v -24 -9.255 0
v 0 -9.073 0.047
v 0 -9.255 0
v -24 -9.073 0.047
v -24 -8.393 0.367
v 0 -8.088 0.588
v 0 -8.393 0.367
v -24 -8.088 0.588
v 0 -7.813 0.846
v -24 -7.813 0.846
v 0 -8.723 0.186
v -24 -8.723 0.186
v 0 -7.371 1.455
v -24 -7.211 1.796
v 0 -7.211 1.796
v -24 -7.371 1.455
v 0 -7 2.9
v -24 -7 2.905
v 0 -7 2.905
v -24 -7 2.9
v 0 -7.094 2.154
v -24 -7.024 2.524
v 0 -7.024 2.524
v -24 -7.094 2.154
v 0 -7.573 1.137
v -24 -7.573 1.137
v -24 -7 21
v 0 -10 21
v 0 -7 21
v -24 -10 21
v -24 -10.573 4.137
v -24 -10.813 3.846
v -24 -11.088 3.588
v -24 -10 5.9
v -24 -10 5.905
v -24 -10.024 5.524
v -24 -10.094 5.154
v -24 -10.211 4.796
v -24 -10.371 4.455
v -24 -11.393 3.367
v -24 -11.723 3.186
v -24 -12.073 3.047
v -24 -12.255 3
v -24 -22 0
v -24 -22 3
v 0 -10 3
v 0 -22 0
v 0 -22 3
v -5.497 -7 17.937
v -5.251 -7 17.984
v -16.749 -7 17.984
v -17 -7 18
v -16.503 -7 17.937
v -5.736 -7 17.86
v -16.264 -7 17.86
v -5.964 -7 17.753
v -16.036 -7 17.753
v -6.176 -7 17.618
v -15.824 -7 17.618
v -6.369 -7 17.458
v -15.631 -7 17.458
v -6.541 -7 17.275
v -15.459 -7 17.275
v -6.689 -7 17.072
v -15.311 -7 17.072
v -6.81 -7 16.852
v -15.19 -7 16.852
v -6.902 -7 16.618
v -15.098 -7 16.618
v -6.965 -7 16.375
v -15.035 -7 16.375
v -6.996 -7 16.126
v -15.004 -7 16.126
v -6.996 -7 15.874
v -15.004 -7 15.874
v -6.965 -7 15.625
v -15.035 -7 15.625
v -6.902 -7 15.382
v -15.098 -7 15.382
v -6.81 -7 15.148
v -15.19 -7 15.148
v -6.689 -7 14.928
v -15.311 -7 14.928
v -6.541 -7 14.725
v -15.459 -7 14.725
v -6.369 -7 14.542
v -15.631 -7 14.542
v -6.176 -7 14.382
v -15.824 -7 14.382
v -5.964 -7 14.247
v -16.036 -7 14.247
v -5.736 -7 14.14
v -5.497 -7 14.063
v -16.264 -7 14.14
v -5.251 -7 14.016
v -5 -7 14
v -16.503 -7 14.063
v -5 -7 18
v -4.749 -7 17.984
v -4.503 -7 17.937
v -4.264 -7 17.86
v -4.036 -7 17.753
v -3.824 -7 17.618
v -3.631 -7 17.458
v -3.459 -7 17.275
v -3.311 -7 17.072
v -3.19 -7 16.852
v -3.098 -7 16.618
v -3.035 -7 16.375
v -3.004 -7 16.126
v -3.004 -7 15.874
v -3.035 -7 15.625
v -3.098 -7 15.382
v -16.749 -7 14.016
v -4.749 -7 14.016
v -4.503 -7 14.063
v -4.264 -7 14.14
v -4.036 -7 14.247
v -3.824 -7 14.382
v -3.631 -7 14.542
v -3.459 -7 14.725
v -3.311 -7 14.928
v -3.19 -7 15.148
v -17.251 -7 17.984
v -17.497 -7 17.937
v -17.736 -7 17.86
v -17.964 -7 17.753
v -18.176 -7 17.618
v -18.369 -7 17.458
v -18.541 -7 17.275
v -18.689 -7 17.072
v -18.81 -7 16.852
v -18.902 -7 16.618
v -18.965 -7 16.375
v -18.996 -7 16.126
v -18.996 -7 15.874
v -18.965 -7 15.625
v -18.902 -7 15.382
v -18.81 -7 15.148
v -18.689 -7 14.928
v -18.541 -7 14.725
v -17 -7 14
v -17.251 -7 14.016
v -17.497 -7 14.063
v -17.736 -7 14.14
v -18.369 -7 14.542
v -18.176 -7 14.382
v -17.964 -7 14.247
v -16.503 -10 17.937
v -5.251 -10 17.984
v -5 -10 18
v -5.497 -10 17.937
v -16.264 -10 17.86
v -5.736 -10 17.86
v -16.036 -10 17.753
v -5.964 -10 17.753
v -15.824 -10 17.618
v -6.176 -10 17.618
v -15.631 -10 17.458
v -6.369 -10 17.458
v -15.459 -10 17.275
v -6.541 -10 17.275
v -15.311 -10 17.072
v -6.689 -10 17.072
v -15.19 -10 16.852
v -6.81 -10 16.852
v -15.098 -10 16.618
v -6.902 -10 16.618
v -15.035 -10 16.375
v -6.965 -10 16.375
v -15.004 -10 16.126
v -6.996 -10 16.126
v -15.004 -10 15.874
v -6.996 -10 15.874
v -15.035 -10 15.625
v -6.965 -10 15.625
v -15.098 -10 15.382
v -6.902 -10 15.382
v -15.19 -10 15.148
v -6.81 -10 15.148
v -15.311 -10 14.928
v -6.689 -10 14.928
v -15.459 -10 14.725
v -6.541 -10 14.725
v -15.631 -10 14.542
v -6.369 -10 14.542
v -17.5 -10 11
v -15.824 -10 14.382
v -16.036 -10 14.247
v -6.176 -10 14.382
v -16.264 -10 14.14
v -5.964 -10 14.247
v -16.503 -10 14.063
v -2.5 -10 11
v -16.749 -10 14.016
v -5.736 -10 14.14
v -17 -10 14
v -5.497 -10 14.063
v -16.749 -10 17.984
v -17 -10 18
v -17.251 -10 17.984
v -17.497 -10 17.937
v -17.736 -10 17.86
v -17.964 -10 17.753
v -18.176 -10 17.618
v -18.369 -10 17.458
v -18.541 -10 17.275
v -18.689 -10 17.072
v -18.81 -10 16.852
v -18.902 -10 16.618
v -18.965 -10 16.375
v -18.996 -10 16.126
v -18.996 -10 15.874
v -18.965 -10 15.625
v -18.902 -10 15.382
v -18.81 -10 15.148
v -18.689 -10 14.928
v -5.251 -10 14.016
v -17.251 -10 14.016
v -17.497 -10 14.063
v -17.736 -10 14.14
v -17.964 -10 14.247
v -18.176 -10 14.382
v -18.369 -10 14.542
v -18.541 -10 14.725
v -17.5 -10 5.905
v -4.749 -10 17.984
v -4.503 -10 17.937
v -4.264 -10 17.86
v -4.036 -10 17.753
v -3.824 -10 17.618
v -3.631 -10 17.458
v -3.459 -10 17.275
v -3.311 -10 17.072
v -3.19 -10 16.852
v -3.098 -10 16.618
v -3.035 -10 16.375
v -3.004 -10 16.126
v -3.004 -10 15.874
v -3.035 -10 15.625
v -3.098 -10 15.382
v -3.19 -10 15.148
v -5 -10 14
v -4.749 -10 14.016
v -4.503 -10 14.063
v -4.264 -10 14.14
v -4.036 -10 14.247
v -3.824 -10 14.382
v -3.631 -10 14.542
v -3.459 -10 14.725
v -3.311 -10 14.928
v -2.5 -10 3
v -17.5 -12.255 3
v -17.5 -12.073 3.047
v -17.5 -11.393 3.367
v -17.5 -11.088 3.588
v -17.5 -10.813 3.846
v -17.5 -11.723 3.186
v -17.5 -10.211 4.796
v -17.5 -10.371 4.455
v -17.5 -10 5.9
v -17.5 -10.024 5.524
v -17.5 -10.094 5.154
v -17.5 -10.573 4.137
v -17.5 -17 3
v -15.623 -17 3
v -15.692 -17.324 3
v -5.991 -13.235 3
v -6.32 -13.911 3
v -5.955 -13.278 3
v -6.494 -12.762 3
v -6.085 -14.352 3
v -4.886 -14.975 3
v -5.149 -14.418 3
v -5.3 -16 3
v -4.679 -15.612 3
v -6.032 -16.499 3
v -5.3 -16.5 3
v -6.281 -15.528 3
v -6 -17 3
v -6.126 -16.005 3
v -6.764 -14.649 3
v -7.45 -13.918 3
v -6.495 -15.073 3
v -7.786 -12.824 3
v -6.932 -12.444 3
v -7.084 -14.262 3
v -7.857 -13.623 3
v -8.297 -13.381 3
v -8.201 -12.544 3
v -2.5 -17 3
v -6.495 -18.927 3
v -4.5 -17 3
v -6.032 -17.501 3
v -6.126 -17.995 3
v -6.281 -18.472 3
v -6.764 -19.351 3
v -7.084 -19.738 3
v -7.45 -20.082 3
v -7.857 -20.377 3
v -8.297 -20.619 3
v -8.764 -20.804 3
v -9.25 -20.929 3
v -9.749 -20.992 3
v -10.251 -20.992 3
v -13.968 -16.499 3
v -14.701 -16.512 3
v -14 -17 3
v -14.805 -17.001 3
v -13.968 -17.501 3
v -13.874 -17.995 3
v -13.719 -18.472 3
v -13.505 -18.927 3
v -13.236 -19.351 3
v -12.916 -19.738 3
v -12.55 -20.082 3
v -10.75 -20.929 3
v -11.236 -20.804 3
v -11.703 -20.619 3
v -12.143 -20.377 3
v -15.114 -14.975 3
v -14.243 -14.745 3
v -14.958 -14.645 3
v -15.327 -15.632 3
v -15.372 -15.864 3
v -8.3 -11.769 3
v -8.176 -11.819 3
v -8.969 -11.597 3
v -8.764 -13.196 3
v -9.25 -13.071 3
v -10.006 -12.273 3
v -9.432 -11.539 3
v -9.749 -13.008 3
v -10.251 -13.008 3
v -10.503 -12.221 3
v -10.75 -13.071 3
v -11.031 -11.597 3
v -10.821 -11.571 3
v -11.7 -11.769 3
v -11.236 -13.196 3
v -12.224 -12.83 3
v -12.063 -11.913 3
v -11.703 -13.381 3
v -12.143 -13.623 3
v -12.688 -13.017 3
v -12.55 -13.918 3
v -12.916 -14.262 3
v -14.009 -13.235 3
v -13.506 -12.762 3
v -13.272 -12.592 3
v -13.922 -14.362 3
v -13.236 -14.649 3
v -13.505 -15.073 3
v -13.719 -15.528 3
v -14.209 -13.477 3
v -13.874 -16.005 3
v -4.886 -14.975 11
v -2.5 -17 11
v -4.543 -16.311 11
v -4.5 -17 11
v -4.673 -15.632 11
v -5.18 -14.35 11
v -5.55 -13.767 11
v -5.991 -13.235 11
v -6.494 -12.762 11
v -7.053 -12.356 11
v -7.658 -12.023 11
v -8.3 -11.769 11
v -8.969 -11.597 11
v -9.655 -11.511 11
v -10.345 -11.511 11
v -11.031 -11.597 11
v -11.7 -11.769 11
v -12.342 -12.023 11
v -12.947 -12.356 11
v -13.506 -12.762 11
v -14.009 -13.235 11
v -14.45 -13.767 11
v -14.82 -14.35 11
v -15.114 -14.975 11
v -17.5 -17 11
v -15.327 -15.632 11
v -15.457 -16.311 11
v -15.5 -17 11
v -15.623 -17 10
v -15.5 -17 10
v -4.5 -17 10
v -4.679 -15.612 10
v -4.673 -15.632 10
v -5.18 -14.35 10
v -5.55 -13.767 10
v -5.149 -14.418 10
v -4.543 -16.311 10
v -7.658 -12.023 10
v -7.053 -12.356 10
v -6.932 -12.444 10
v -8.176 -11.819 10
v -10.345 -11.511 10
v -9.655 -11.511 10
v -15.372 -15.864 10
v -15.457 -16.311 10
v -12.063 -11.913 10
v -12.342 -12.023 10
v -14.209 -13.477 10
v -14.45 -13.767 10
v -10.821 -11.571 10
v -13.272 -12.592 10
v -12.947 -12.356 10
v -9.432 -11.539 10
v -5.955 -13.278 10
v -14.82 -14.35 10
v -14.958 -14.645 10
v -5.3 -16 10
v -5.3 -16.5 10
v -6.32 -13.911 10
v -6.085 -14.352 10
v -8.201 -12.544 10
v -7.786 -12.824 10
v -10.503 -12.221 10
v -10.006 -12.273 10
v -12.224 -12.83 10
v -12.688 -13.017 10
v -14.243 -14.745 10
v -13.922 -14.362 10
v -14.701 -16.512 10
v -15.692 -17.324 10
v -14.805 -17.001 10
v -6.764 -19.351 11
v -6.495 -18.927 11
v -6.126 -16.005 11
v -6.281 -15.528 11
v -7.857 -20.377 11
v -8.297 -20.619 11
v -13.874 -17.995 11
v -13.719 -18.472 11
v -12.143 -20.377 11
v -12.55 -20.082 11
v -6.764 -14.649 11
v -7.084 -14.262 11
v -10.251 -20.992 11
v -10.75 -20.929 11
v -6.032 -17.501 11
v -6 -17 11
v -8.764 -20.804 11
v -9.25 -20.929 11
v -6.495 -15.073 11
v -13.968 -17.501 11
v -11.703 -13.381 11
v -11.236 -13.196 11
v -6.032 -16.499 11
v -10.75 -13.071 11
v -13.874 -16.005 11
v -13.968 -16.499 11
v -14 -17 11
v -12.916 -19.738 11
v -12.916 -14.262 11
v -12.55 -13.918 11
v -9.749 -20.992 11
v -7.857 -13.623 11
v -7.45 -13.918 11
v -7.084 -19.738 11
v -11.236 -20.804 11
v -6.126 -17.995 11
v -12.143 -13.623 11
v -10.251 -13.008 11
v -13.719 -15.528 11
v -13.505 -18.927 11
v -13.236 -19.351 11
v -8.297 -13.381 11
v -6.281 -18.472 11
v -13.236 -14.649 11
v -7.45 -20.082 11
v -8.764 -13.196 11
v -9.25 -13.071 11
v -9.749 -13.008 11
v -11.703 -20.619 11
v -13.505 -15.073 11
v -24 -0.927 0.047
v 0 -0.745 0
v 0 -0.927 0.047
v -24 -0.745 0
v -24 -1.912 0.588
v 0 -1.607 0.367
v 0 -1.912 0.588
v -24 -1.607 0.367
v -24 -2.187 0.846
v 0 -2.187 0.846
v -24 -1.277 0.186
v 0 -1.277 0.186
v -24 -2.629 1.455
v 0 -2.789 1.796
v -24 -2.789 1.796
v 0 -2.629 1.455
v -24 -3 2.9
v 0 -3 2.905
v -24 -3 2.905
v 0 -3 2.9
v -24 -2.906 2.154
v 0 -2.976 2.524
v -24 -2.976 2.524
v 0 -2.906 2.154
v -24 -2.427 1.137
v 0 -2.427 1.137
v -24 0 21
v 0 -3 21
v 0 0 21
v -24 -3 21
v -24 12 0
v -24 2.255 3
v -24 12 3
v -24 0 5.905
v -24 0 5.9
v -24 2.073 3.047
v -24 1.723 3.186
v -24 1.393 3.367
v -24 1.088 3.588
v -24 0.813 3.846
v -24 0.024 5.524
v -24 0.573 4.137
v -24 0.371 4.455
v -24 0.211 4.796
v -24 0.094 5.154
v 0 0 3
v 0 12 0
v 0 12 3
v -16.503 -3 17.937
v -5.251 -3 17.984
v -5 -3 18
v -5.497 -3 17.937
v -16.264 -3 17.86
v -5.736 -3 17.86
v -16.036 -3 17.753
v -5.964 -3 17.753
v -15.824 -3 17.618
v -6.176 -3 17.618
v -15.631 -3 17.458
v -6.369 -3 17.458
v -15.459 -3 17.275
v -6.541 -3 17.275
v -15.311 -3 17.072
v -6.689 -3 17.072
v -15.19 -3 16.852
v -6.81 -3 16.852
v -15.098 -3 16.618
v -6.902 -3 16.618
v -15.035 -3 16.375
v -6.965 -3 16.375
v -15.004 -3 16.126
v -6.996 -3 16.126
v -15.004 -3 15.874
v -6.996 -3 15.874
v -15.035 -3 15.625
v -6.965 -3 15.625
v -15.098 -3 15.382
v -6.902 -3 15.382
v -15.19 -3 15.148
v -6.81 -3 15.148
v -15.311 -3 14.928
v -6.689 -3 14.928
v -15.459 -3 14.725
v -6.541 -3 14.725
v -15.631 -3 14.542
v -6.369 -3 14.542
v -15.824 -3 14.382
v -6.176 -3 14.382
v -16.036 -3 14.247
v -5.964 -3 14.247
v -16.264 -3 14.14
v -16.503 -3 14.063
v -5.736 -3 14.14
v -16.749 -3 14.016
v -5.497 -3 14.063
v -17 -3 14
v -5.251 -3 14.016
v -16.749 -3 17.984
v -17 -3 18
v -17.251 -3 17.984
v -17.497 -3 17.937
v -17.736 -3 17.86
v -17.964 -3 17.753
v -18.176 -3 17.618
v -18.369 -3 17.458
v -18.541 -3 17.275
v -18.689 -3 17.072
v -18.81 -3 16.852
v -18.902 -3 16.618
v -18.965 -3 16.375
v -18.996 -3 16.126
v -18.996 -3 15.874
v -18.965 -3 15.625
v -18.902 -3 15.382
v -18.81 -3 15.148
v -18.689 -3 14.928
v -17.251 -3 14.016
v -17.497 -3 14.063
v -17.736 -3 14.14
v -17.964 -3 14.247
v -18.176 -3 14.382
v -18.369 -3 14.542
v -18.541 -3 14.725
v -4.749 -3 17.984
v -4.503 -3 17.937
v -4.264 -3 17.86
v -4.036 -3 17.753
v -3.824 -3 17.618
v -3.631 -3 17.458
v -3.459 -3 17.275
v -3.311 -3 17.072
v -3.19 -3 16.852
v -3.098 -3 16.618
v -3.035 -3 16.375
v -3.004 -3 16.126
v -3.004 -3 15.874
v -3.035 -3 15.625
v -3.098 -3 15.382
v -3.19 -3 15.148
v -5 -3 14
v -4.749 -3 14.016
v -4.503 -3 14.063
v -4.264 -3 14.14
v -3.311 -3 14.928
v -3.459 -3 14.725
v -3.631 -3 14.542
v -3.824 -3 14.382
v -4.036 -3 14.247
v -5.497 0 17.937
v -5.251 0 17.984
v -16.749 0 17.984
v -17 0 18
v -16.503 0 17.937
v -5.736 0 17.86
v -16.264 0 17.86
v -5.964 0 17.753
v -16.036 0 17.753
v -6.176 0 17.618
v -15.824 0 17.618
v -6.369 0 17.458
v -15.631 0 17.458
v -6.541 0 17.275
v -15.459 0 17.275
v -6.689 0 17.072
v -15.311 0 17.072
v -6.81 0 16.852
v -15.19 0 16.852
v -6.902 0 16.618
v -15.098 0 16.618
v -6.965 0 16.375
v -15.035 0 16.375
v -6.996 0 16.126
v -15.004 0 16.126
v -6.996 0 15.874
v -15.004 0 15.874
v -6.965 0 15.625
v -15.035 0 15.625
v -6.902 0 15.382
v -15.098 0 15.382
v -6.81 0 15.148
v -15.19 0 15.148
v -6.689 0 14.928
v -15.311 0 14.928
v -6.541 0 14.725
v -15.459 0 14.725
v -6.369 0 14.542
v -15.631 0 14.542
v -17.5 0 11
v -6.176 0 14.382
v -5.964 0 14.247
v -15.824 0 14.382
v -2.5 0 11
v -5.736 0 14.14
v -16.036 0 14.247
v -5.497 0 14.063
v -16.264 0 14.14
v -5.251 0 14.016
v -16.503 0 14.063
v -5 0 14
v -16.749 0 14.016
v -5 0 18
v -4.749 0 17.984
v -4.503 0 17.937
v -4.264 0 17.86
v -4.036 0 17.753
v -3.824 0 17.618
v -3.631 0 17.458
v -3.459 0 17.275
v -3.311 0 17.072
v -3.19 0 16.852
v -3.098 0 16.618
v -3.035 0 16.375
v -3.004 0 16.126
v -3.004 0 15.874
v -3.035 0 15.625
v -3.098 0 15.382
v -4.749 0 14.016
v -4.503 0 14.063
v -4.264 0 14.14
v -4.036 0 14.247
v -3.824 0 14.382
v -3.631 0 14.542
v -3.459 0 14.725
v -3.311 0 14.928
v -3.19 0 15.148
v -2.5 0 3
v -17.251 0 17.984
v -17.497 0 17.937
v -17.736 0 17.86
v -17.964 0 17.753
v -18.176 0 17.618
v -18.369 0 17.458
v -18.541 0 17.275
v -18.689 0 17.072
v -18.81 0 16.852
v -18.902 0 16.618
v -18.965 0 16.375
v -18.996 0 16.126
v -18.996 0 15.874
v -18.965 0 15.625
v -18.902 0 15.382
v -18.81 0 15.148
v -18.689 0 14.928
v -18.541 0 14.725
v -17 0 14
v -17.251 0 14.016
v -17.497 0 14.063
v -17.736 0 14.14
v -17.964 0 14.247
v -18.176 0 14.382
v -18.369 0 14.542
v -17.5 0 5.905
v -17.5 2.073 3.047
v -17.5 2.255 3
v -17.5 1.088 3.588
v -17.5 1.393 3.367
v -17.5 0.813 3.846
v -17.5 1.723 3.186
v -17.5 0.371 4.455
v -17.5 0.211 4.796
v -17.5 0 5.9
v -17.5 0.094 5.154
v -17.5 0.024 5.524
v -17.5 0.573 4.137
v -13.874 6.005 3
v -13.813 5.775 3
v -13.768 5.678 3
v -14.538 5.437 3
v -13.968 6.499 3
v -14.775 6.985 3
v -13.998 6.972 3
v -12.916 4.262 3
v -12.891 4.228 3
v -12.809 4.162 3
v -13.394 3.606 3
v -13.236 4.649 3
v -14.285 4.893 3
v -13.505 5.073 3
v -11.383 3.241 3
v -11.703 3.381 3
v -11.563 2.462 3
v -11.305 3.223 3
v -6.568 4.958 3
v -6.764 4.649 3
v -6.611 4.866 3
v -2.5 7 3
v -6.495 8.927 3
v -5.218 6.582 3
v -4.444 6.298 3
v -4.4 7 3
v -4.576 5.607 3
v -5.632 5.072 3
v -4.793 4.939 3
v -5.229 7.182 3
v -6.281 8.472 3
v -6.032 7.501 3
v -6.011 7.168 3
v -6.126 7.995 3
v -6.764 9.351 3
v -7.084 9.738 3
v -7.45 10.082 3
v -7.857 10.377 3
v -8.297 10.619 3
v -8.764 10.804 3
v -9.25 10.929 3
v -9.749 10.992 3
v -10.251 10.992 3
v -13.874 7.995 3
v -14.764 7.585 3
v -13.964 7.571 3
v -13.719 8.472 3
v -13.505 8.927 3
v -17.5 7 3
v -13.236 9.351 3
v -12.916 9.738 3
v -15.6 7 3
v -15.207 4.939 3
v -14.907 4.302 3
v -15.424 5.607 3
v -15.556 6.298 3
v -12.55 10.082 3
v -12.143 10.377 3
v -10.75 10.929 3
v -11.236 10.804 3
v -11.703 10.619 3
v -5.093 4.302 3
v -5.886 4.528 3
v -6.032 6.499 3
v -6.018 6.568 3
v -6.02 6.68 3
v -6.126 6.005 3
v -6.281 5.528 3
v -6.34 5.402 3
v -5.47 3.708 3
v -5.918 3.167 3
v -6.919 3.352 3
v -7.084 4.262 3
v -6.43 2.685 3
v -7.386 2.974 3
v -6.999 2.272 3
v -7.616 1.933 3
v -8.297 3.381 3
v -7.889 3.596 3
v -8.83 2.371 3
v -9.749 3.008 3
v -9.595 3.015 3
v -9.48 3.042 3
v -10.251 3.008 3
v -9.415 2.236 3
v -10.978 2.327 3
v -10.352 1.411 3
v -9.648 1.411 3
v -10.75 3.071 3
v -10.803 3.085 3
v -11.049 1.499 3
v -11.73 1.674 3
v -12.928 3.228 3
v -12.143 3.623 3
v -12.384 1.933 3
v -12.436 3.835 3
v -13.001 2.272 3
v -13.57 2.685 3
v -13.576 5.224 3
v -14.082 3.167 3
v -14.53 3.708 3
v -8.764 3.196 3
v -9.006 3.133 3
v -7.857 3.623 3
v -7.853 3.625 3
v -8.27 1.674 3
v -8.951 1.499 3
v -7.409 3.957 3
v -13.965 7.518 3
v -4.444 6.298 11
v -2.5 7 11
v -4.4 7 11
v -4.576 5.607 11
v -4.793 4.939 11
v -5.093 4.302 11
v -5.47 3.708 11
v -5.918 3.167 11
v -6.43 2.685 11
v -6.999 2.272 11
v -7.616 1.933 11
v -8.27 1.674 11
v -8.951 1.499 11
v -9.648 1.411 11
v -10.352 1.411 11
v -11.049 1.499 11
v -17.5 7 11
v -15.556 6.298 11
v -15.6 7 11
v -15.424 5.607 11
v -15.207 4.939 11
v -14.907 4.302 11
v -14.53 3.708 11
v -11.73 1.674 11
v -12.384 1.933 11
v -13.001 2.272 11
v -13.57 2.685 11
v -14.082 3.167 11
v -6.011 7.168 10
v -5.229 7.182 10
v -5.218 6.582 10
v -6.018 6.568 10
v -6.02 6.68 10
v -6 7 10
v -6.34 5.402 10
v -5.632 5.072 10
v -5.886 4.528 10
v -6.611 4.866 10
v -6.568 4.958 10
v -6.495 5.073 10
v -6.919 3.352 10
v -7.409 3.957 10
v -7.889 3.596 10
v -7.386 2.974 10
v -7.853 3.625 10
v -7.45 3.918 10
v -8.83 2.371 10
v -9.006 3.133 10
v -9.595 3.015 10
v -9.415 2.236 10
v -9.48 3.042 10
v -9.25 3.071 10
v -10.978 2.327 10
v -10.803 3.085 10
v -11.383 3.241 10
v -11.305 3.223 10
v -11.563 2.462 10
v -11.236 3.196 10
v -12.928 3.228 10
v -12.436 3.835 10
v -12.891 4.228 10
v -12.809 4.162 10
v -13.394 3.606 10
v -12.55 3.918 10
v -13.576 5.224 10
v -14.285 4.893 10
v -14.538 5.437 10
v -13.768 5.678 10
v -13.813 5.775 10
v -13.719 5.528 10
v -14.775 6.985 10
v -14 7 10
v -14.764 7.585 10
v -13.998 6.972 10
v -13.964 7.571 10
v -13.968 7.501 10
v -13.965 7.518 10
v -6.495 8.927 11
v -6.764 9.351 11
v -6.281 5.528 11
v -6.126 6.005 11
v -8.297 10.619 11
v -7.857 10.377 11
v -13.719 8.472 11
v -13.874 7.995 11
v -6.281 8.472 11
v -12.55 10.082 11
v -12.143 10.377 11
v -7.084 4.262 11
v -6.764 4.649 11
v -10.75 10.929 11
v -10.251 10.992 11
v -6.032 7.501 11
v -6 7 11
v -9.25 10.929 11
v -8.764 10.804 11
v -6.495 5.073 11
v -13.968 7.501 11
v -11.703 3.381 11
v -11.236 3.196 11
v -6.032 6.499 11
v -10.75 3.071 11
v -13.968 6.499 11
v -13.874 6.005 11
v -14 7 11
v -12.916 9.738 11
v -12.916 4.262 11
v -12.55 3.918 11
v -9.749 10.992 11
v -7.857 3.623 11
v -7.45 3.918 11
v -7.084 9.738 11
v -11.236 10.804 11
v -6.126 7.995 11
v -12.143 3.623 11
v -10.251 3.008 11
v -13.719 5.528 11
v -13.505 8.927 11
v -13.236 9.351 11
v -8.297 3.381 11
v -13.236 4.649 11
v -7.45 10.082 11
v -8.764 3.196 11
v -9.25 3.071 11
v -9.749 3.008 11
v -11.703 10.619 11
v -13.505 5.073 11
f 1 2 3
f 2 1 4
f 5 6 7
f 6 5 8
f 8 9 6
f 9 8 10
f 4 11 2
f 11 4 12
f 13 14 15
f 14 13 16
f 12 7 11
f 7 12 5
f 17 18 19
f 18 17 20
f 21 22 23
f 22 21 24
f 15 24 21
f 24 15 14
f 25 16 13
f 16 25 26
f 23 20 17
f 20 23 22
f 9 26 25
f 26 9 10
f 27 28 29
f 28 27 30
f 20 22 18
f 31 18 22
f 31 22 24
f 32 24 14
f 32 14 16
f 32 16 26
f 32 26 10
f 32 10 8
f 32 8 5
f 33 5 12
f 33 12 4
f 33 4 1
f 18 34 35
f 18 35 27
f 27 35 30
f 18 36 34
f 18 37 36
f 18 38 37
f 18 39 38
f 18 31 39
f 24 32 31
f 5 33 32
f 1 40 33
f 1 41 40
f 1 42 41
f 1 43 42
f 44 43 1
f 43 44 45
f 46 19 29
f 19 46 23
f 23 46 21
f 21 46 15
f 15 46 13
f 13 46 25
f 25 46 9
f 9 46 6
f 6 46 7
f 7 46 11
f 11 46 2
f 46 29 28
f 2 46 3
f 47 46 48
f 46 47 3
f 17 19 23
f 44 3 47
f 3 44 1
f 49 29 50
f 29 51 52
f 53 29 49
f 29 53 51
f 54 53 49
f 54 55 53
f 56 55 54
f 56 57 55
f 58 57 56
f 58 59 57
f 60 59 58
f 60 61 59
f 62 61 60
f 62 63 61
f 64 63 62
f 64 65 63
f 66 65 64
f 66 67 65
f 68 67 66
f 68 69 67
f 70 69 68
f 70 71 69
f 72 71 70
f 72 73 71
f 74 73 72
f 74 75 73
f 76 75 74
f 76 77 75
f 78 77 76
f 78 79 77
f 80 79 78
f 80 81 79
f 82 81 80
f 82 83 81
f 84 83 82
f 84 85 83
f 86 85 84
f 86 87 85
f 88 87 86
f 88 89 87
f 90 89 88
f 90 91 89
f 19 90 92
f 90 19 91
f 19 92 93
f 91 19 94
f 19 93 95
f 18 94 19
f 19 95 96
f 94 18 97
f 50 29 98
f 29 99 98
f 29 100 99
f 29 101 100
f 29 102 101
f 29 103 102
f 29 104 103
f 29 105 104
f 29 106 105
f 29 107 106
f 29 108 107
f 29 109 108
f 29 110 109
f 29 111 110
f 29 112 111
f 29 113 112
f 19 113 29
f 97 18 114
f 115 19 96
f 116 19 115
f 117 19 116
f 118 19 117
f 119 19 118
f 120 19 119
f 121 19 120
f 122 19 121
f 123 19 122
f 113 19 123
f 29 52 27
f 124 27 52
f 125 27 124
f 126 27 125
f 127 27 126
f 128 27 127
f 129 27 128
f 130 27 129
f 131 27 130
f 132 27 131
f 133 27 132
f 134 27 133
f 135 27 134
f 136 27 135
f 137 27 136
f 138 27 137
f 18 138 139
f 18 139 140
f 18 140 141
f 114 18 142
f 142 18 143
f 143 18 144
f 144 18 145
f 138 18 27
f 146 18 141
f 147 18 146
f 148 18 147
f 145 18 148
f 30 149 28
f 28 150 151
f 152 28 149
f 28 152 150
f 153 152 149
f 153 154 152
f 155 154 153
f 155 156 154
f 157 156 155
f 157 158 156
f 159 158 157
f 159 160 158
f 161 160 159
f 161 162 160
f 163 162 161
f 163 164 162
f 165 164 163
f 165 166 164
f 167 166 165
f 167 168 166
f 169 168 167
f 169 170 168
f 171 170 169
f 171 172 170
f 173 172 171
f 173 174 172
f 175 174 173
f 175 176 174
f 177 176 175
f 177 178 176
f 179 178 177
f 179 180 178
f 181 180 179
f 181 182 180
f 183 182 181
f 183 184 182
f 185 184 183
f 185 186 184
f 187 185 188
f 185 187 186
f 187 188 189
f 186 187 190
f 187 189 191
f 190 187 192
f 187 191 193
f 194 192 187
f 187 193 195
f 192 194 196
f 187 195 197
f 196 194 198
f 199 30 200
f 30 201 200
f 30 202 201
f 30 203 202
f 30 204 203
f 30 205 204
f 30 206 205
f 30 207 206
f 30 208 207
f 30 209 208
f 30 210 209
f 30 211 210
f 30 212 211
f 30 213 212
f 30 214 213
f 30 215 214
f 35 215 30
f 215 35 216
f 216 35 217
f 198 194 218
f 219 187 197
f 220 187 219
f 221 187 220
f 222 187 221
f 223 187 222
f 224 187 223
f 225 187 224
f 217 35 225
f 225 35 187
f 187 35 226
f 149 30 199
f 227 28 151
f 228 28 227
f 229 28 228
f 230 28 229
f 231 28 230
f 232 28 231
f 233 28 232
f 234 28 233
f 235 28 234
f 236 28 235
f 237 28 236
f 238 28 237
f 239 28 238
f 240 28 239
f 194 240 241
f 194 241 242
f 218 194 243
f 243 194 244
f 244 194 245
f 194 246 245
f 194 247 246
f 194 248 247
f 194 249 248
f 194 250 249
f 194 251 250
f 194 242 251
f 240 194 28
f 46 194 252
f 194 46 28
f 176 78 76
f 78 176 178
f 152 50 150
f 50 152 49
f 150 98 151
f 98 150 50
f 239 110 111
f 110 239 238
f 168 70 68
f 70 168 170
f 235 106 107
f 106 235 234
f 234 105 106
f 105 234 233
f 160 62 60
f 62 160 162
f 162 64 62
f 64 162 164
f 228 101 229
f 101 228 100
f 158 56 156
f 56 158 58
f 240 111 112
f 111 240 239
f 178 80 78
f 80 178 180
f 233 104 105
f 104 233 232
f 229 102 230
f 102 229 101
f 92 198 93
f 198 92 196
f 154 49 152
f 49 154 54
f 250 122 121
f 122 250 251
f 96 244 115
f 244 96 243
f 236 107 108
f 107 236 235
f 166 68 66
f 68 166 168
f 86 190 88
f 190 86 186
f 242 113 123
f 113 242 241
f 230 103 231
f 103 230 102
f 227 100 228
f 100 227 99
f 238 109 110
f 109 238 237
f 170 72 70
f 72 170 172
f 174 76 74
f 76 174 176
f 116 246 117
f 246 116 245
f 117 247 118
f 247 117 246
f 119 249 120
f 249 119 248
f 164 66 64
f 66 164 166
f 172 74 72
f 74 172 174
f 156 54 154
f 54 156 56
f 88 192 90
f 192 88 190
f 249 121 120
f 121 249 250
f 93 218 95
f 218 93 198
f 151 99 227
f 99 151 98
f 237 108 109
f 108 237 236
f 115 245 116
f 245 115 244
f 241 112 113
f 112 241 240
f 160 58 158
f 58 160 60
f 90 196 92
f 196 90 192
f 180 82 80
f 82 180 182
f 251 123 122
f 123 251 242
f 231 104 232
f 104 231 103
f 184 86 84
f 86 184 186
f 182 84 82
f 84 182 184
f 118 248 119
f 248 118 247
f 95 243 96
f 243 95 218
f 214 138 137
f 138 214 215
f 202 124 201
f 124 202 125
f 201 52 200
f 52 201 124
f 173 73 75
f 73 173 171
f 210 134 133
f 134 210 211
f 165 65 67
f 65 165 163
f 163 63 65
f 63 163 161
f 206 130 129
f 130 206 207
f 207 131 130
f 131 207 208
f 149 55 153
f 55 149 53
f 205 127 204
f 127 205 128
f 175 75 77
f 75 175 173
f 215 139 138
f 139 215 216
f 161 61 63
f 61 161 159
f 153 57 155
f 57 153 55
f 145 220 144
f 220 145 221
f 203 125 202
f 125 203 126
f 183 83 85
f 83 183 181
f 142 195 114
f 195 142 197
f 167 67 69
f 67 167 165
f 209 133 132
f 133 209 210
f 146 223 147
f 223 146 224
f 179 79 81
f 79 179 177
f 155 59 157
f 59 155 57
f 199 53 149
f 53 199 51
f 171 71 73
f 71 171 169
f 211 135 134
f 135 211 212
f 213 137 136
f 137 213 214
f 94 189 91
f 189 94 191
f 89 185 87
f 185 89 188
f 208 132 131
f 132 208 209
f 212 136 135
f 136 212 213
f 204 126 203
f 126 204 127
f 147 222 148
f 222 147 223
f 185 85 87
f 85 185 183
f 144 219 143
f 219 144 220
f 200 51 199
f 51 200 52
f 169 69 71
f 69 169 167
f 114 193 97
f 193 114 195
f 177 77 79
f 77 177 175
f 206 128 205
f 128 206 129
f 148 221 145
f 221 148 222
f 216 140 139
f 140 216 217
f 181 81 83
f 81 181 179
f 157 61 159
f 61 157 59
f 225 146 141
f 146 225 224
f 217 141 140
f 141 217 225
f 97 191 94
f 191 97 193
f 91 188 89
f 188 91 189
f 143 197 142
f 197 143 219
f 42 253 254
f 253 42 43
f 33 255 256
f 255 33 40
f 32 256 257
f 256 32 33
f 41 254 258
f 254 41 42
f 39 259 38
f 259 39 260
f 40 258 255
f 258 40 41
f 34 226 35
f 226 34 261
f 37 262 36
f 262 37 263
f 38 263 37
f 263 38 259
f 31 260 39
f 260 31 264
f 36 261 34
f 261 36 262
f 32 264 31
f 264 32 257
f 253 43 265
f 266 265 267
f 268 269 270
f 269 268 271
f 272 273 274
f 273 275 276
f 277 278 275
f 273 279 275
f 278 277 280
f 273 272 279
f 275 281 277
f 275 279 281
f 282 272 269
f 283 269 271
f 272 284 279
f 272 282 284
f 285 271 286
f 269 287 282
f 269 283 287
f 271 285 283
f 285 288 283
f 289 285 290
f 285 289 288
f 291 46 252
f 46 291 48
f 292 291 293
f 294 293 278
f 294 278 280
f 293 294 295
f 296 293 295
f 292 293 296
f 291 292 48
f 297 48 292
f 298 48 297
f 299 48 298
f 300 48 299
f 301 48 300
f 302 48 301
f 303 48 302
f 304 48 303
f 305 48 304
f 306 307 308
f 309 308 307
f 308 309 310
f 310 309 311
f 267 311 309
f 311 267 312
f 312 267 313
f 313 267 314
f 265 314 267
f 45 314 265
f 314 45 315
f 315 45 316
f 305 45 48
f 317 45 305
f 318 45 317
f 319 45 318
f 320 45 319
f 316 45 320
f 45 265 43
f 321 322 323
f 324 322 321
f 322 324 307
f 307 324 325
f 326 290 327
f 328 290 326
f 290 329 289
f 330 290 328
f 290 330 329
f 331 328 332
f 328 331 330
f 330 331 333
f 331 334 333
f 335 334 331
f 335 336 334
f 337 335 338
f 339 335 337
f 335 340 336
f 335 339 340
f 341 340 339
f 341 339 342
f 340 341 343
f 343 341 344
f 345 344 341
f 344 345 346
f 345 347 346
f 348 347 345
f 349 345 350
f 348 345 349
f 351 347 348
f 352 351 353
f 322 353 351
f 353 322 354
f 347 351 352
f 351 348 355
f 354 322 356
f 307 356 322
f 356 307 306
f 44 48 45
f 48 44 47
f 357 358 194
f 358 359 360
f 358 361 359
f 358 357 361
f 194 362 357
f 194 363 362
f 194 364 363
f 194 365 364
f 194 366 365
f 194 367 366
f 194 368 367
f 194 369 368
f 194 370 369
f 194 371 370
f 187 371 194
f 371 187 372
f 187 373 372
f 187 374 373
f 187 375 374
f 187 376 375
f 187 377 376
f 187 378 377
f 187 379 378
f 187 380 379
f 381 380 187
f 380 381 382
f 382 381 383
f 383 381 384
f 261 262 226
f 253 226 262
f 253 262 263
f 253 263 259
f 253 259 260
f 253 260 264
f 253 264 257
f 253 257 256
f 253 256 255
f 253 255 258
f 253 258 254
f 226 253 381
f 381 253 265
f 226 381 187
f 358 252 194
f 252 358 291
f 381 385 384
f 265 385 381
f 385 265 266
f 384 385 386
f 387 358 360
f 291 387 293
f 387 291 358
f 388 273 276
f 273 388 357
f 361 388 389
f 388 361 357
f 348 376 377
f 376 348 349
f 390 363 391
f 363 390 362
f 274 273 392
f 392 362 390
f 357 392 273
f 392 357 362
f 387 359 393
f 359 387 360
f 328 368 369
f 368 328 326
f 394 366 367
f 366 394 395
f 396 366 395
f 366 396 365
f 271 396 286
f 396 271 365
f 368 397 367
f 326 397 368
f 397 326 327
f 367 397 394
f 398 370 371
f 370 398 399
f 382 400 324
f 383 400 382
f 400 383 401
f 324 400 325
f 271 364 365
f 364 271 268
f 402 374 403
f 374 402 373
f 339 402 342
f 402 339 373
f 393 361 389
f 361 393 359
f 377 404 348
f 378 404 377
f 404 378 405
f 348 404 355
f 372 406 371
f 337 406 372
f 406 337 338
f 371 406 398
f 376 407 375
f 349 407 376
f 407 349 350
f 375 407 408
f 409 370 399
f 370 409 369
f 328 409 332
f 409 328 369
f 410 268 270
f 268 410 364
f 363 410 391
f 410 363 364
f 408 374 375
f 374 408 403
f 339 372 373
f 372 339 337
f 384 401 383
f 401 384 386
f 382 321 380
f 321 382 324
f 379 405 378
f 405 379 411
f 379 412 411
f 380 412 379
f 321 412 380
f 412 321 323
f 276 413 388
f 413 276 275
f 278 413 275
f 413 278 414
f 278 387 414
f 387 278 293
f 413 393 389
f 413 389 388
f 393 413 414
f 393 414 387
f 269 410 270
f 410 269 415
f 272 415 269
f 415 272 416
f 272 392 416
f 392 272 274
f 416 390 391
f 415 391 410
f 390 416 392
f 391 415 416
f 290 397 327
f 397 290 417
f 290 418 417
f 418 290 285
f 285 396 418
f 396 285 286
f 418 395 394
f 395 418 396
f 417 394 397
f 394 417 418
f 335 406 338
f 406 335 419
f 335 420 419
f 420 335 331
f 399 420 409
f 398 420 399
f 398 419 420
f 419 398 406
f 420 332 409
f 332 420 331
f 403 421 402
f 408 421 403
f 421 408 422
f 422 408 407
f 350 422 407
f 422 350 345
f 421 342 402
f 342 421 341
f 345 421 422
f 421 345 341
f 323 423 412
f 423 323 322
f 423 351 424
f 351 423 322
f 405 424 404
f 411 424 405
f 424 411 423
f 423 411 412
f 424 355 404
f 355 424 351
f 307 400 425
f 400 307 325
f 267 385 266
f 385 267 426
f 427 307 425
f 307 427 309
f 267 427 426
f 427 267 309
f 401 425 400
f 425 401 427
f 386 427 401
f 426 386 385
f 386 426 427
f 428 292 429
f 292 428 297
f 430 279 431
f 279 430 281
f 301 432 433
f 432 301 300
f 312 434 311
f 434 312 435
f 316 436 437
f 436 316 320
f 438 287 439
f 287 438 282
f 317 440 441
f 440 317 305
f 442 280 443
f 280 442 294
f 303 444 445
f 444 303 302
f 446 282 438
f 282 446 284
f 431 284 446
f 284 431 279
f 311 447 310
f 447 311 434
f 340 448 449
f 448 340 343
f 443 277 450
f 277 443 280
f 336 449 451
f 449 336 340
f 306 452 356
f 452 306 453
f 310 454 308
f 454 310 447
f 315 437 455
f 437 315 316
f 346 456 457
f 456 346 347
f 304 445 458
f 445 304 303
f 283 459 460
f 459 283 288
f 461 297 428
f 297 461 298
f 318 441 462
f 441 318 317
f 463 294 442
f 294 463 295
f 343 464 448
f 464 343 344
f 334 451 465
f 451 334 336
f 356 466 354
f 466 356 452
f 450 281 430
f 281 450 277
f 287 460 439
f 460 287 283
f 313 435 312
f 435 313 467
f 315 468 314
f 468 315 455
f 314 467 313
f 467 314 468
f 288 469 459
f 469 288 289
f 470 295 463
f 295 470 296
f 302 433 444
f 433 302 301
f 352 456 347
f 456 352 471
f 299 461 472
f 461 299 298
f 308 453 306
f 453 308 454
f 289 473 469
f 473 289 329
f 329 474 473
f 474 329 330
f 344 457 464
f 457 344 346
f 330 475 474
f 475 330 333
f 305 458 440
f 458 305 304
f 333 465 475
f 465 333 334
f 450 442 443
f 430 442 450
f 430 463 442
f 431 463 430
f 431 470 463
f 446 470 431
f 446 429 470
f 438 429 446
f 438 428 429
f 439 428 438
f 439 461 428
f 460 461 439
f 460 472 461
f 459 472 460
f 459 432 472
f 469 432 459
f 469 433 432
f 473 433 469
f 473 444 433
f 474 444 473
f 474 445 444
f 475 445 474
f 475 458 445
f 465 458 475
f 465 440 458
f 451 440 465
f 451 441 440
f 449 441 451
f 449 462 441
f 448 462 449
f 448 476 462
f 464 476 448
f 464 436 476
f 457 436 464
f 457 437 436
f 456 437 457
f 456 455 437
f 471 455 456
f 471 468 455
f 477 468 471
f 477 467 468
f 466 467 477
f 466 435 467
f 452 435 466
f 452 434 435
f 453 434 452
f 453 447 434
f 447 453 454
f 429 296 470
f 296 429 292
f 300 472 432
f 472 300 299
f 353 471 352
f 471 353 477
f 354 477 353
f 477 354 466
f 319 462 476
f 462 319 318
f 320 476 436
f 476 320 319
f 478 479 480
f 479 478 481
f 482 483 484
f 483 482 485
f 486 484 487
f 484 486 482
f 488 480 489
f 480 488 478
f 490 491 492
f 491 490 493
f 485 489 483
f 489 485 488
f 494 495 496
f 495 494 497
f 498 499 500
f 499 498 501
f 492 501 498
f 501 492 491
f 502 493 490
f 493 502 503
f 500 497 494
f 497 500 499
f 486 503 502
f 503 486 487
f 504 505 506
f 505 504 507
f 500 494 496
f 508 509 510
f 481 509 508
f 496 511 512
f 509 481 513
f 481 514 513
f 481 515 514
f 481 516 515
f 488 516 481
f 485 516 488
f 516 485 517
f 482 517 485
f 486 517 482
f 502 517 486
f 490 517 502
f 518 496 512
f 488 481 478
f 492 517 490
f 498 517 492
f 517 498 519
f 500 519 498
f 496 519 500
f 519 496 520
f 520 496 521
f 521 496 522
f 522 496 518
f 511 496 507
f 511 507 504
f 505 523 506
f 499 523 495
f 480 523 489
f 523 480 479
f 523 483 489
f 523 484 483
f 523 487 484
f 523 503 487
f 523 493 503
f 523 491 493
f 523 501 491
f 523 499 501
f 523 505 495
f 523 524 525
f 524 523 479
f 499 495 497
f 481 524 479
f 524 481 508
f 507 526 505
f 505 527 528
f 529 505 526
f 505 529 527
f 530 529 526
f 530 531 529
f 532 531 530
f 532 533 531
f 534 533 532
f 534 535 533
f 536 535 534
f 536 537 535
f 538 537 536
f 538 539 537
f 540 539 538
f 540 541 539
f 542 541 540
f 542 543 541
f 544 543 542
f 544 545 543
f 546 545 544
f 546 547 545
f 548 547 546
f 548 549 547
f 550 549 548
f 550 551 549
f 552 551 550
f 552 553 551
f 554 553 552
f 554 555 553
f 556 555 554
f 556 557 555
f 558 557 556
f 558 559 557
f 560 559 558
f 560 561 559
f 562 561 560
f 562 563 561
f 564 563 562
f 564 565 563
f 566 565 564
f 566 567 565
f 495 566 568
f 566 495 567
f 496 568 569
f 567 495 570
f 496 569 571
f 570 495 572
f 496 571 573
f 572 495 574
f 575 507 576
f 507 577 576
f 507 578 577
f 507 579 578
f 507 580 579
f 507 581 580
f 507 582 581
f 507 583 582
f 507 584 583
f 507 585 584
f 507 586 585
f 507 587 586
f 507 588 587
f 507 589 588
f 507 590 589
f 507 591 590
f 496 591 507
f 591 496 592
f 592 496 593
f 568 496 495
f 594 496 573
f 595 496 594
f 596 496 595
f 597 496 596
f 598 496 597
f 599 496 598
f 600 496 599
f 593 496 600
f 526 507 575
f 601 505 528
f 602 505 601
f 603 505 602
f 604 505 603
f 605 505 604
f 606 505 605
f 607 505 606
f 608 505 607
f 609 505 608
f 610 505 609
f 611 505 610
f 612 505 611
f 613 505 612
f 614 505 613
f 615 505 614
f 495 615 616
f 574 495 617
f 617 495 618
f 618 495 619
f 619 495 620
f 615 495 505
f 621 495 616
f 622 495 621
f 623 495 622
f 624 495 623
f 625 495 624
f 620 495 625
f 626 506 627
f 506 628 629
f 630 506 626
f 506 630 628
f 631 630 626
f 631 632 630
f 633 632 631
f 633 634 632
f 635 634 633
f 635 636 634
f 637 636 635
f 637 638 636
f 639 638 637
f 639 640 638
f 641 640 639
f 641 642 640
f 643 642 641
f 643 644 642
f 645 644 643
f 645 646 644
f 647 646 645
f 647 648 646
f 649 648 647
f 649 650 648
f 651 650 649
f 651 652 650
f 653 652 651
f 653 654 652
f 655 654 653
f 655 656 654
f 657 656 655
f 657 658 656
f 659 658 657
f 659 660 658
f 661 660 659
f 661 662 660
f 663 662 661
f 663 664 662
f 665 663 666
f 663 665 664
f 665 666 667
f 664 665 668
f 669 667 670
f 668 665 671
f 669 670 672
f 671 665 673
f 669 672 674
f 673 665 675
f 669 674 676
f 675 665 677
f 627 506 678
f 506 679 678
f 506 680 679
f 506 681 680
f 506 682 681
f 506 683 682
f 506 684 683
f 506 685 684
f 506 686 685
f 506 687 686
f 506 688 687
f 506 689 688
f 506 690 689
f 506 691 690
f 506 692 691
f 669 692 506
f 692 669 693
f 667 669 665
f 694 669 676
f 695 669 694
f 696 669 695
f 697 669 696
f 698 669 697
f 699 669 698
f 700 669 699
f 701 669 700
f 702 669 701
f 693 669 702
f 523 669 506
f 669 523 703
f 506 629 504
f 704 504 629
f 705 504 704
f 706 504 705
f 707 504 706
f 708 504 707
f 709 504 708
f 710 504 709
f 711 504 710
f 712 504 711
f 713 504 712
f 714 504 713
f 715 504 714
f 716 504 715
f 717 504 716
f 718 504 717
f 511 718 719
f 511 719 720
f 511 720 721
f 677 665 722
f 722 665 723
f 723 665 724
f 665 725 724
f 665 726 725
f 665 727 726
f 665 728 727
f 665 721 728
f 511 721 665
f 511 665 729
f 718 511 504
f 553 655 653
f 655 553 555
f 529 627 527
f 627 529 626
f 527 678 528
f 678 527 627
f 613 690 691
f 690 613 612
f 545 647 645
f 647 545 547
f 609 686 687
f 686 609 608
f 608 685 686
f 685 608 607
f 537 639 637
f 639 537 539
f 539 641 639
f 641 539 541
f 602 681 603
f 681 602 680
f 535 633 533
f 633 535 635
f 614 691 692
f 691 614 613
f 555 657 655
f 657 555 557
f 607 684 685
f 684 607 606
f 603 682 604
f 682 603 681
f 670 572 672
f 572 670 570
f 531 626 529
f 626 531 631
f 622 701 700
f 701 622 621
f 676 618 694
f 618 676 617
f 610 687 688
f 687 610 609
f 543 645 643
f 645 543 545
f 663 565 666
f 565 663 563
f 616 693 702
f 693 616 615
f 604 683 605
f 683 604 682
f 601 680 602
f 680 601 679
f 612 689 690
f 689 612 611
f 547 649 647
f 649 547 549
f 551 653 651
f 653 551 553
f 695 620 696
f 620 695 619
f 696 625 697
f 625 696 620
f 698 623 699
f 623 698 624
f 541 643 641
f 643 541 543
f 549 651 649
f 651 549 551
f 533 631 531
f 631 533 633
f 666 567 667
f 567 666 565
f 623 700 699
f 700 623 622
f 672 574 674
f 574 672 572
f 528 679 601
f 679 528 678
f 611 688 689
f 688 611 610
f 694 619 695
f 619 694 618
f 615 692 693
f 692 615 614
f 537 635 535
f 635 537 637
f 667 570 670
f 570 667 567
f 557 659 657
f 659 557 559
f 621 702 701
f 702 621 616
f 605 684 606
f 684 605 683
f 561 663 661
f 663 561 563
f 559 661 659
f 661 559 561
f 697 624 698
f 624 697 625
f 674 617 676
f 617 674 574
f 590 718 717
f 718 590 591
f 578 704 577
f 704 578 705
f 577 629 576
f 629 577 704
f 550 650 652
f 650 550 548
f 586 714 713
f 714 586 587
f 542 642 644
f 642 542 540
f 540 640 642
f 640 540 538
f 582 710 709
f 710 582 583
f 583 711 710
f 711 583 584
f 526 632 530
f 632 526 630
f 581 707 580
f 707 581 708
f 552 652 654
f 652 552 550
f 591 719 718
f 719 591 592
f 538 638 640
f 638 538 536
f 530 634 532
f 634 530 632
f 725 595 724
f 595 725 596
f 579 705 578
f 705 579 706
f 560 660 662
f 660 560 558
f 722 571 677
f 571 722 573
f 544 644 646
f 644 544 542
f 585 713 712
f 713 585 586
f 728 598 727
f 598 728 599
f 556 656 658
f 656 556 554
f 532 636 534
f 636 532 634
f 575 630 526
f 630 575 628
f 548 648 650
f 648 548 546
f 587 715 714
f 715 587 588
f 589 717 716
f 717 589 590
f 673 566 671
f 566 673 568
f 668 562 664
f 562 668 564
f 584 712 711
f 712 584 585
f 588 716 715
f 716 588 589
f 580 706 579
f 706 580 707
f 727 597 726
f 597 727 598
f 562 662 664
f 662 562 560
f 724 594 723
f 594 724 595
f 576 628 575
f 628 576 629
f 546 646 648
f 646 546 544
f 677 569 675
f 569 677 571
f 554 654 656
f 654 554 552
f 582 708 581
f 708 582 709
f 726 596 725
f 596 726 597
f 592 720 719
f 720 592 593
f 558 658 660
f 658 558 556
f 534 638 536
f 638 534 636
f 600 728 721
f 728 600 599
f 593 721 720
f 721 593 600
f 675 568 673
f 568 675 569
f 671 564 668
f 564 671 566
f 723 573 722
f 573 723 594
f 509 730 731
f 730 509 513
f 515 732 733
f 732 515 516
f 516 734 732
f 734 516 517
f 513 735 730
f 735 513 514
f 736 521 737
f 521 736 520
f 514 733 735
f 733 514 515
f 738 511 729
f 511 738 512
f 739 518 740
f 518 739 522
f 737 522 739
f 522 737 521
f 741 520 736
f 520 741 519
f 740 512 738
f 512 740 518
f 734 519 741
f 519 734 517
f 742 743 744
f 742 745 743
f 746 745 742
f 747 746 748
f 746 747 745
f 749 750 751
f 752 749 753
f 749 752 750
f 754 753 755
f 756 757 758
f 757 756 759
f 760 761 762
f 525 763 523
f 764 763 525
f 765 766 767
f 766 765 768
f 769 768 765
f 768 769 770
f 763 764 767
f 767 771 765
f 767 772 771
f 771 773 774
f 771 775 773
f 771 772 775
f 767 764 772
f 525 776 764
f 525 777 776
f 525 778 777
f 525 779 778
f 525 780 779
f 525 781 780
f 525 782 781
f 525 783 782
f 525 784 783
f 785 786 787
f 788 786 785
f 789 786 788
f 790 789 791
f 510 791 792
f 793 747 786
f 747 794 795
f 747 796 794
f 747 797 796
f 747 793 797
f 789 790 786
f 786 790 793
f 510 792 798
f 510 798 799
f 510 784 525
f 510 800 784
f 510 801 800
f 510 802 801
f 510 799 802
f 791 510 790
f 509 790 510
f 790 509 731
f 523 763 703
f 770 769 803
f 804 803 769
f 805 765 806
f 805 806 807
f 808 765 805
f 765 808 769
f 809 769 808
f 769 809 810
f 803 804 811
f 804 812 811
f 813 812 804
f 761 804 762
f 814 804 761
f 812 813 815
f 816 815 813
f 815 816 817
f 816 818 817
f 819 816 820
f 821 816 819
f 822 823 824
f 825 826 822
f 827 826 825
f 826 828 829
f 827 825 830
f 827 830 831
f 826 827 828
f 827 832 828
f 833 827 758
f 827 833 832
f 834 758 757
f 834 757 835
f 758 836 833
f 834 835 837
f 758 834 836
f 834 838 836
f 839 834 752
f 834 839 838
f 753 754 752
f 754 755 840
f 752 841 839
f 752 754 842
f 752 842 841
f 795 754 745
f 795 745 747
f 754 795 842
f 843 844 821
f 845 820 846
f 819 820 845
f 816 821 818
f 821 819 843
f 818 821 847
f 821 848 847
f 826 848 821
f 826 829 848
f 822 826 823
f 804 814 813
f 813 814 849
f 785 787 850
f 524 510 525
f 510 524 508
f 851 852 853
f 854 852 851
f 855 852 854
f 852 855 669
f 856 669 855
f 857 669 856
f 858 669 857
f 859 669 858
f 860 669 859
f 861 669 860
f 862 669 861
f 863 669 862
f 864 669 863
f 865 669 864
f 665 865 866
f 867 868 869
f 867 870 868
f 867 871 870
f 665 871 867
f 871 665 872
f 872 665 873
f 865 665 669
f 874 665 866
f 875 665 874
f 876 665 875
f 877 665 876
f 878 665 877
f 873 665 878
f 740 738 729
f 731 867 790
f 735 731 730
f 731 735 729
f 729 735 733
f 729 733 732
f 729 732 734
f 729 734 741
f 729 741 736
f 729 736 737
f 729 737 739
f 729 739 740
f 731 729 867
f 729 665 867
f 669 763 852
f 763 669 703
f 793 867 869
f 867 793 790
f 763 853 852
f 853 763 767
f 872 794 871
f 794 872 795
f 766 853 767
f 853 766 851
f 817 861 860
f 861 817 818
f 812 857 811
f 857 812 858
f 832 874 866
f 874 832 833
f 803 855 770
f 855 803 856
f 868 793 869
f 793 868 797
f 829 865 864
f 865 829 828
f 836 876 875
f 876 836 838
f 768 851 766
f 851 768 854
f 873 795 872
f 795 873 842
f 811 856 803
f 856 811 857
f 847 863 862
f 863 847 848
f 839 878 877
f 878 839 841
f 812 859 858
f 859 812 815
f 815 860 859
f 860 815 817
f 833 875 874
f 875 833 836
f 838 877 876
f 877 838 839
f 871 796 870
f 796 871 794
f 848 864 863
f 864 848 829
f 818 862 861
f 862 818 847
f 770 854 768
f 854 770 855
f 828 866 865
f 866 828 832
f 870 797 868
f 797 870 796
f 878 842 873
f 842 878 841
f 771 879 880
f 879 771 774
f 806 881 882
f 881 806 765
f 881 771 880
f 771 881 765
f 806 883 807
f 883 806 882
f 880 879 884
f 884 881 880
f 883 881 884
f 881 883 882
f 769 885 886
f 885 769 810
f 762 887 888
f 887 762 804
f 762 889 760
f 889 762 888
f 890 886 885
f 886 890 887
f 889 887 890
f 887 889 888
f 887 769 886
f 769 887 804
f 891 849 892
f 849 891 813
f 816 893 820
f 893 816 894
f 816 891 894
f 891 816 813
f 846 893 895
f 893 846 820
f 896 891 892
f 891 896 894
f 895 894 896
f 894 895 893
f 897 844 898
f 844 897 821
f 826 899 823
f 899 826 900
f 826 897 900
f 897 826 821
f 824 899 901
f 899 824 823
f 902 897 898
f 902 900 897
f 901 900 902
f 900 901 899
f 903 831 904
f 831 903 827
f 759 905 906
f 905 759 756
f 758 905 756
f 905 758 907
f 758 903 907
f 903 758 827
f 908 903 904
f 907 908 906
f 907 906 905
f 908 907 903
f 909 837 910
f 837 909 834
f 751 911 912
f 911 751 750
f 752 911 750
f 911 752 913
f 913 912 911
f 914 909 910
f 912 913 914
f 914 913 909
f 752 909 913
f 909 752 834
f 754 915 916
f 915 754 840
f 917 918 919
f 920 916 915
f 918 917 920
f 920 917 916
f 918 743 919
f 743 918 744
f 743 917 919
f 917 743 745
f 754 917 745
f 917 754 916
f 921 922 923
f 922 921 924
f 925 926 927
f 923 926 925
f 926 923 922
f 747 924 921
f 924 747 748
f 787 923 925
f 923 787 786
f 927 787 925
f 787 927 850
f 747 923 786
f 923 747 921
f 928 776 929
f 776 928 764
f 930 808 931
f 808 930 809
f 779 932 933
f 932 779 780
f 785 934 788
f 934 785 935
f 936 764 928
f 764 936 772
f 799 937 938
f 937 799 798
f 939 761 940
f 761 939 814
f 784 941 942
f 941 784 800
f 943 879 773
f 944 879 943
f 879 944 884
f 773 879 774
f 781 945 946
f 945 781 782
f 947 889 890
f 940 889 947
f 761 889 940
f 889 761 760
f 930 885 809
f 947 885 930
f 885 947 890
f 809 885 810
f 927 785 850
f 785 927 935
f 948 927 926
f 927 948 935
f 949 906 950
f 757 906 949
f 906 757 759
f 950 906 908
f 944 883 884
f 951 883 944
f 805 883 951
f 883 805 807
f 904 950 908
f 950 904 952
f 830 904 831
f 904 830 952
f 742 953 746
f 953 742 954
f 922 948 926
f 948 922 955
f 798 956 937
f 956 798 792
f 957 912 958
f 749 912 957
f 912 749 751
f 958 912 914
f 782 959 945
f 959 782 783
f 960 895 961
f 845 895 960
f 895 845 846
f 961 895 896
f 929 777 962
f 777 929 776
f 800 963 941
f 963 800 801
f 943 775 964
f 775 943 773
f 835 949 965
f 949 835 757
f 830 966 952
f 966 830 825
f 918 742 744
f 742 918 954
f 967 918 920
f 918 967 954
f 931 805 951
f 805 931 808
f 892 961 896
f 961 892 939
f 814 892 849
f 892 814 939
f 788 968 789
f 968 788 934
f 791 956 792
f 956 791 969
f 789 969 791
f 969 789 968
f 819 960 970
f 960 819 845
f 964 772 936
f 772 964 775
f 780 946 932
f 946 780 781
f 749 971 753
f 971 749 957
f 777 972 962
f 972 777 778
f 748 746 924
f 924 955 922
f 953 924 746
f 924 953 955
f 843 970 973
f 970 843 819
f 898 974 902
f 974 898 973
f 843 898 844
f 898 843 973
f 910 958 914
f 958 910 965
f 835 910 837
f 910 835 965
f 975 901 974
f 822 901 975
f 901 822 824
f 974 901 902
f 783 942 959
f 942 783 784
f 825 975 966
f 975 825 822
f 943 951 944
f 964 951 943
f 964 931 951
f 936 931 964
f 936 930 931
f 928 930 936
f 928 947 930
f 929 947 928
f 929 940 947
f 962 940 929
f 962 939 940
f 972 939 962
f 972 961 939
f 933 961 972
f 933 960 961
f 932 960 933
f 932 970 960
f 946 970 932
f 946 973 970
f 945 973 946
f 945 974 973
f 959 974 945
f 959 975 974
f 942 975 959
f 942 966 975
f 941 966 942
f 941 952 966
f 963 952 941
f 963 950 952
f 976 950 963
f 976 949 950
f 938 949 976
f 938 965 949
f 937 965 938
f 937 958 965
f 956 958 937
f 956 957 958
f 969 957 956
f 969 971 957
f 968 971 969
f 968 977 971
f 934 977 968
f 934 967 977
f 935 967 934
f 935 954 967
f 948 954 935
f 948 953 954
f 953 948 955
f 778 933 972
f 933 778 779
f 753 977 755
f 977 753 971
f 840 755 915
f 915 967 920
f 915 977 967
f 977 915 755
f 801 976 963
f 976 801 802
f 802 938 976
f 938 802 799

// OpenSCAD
$fn=50;

module fillet(r, h) {
    translate([r / 2, r / 2, 0])

        difference() {
            cube([r + 0.01, r + 0.01, h], center = true);

            translate([r/2, r/2, 0])
                cylinder(r = r, h = h + 1, center = true);

        }
}

module tooth(xpos,ypos,zpos,rot) {
	zHeight = 1.5;
	xLength = 7;
	yDepth = -0.8;
	a = 0.5;

	translate([xpos,ypos,zpos]) {
		rotate([rot,0,0]){
		polyhedron(
			points=[[0,0,0] , [0,0,zHeight] , [xLength,0,zHeight] , [xLength,0,0] ,[0,yDepth,a] , [0,yDepth,(zHeight-a)] , [xLength,yDepth,(zHeight-a)] , [xLength,yDepth,a]],
			triangles=[[0,2,1],[0,3,2], [0,1,4],[1,5,4], [0,4,7],[0,7,3], [4,5,6],[4,6,7], [5,1,6],[6,1,2], [3,7,6],[3,6,2] 
			]);
		}
	}
}

module tooth2(xpos,ypos,zpos,rot) {
	zHeight = 0.6;
	xLength = 7;
	yDepth = 0.8;
	a = 0.5;

	translate([xpos,ypos ,zpos]) {
		rotate([rot+6,0,0]){
			cube([xLength, yDepth, zHeight]);
		}
	}
}

module backPlate(thick, holeRad, height1, trapZpos, r) {
	//back with 2 holes
	difference() { 
		difference() { cube([21,thick,height1]); translate ([-0.10,r,height1/2]) rotate([0,0,-90]) fillet(r, height1+2);}
		union() {
			translate([16,4,trapZpos-5]) rotate([90,0,0]) cylinder(thick+2,holeRad,holeRad);
			translate([16,4,trapZpos+7]) rotate([90,0,0]) cylinder(thick+2,holeRad,holeRad); 
		}
	}
}
module sidePlate(thick, height1, blockH, r) {

	//left side
	union() { translate([0,-12,0]) cube([thick,12,height1]); translate ([2.9,0,19.5]) rotate([0,0,-90]) fillet(r, height1-blockH);}

}
module spiggot(ypos, trapZpos, rad, trapW) {
	//smooth spigot, belt trap
	translate([3, ypos, trapZpos]) rotate([0,90,0]) cylinder(trapW, rad, rad);
}
module outerBlock(spigYpos, spigR, trapGap, trapZpos, trapW, blockH) {
	//outerblock, belt trap
	difference() {
		translate([3,spigYpos, trapZpos-7.5]) cube([trapW,10,blockH]);
		translate([2,spigYpos, trapZpos]) rotate([0,90,0]) cylinder(trapW + 2, spigR + trapGap, spigR + trapGap);
	}
}


r = 3; //chamfer raduis

trapWidth = 8;
spigRad = 4; //radius
trapGap = 1.5;
trapZpos = 10;
spigYpos = -7;

screwHoleRad = 2;
backThick = 3;
sideThick = 3;

Height = 24;
blockHeight = 15;
toothAngleStep = 28;
toothAngleStep2 = toothAngleStep -2;
rotAdjust = 6;
rotAdjustMirror =  85;


rotate([0,-90,0]) {	

//Left	Hand	
translate([0,-10,0]) {
	backPlate(backThick, screwHoleRad, Height, trapZpos, r );
	sidePlate(backThick, Height, blockHeight, r);
	spiggot(spigYpos, trapZpos, spigRad, trapWidth) ;
	outerBlock(spigYpos, spigRad, trapGap, trapZpos, trapWidth, blockHeight) ;

	for (z = [-3 : 3]) {
		color("blue") tooth(
		sideThick, 
		(((spigRad+trapGap ) * cos ((toothAngleStep * z)-rotAdjust)) + spigYpos), 
		(((spigRad+trapGap ) * sin ((toothAngleStep * z)-rotAdjust)) + trapZpos),
		(toothAngleStep * z)-rotAdjust
		);
	}
}

//Right Hand
mirror([0,1,0]) {
	backPlate(backThick, screwHoleRad, Height, trapZpos, r );
	sidePlate(backThick, Height, blockHeight, r);
	spiggot(spigYpos, trapZpos, spigRad, trapWidth) ;
	outerBlock(spigYpos, spigRad, trapGap+0.1, trapZpos, trapWidth, blockHeight) ;

	
	for (z = [0 : 7]) {
		color("red") tooth2(
			sideThick, 
			(((spigRad + 0.8 )* cos ((toothAngleStep2 * z)-rotAdjustMirror)) + spigYpos), 
			(((spigRad  + 0.8 )* sin ((toothAngleStep2 * z)-rotAdjustMirror)) + trapZpos),
			((toothAngleStep2 ) * z) + 168 - rotAdjustMirror
		);
	}
}

}
